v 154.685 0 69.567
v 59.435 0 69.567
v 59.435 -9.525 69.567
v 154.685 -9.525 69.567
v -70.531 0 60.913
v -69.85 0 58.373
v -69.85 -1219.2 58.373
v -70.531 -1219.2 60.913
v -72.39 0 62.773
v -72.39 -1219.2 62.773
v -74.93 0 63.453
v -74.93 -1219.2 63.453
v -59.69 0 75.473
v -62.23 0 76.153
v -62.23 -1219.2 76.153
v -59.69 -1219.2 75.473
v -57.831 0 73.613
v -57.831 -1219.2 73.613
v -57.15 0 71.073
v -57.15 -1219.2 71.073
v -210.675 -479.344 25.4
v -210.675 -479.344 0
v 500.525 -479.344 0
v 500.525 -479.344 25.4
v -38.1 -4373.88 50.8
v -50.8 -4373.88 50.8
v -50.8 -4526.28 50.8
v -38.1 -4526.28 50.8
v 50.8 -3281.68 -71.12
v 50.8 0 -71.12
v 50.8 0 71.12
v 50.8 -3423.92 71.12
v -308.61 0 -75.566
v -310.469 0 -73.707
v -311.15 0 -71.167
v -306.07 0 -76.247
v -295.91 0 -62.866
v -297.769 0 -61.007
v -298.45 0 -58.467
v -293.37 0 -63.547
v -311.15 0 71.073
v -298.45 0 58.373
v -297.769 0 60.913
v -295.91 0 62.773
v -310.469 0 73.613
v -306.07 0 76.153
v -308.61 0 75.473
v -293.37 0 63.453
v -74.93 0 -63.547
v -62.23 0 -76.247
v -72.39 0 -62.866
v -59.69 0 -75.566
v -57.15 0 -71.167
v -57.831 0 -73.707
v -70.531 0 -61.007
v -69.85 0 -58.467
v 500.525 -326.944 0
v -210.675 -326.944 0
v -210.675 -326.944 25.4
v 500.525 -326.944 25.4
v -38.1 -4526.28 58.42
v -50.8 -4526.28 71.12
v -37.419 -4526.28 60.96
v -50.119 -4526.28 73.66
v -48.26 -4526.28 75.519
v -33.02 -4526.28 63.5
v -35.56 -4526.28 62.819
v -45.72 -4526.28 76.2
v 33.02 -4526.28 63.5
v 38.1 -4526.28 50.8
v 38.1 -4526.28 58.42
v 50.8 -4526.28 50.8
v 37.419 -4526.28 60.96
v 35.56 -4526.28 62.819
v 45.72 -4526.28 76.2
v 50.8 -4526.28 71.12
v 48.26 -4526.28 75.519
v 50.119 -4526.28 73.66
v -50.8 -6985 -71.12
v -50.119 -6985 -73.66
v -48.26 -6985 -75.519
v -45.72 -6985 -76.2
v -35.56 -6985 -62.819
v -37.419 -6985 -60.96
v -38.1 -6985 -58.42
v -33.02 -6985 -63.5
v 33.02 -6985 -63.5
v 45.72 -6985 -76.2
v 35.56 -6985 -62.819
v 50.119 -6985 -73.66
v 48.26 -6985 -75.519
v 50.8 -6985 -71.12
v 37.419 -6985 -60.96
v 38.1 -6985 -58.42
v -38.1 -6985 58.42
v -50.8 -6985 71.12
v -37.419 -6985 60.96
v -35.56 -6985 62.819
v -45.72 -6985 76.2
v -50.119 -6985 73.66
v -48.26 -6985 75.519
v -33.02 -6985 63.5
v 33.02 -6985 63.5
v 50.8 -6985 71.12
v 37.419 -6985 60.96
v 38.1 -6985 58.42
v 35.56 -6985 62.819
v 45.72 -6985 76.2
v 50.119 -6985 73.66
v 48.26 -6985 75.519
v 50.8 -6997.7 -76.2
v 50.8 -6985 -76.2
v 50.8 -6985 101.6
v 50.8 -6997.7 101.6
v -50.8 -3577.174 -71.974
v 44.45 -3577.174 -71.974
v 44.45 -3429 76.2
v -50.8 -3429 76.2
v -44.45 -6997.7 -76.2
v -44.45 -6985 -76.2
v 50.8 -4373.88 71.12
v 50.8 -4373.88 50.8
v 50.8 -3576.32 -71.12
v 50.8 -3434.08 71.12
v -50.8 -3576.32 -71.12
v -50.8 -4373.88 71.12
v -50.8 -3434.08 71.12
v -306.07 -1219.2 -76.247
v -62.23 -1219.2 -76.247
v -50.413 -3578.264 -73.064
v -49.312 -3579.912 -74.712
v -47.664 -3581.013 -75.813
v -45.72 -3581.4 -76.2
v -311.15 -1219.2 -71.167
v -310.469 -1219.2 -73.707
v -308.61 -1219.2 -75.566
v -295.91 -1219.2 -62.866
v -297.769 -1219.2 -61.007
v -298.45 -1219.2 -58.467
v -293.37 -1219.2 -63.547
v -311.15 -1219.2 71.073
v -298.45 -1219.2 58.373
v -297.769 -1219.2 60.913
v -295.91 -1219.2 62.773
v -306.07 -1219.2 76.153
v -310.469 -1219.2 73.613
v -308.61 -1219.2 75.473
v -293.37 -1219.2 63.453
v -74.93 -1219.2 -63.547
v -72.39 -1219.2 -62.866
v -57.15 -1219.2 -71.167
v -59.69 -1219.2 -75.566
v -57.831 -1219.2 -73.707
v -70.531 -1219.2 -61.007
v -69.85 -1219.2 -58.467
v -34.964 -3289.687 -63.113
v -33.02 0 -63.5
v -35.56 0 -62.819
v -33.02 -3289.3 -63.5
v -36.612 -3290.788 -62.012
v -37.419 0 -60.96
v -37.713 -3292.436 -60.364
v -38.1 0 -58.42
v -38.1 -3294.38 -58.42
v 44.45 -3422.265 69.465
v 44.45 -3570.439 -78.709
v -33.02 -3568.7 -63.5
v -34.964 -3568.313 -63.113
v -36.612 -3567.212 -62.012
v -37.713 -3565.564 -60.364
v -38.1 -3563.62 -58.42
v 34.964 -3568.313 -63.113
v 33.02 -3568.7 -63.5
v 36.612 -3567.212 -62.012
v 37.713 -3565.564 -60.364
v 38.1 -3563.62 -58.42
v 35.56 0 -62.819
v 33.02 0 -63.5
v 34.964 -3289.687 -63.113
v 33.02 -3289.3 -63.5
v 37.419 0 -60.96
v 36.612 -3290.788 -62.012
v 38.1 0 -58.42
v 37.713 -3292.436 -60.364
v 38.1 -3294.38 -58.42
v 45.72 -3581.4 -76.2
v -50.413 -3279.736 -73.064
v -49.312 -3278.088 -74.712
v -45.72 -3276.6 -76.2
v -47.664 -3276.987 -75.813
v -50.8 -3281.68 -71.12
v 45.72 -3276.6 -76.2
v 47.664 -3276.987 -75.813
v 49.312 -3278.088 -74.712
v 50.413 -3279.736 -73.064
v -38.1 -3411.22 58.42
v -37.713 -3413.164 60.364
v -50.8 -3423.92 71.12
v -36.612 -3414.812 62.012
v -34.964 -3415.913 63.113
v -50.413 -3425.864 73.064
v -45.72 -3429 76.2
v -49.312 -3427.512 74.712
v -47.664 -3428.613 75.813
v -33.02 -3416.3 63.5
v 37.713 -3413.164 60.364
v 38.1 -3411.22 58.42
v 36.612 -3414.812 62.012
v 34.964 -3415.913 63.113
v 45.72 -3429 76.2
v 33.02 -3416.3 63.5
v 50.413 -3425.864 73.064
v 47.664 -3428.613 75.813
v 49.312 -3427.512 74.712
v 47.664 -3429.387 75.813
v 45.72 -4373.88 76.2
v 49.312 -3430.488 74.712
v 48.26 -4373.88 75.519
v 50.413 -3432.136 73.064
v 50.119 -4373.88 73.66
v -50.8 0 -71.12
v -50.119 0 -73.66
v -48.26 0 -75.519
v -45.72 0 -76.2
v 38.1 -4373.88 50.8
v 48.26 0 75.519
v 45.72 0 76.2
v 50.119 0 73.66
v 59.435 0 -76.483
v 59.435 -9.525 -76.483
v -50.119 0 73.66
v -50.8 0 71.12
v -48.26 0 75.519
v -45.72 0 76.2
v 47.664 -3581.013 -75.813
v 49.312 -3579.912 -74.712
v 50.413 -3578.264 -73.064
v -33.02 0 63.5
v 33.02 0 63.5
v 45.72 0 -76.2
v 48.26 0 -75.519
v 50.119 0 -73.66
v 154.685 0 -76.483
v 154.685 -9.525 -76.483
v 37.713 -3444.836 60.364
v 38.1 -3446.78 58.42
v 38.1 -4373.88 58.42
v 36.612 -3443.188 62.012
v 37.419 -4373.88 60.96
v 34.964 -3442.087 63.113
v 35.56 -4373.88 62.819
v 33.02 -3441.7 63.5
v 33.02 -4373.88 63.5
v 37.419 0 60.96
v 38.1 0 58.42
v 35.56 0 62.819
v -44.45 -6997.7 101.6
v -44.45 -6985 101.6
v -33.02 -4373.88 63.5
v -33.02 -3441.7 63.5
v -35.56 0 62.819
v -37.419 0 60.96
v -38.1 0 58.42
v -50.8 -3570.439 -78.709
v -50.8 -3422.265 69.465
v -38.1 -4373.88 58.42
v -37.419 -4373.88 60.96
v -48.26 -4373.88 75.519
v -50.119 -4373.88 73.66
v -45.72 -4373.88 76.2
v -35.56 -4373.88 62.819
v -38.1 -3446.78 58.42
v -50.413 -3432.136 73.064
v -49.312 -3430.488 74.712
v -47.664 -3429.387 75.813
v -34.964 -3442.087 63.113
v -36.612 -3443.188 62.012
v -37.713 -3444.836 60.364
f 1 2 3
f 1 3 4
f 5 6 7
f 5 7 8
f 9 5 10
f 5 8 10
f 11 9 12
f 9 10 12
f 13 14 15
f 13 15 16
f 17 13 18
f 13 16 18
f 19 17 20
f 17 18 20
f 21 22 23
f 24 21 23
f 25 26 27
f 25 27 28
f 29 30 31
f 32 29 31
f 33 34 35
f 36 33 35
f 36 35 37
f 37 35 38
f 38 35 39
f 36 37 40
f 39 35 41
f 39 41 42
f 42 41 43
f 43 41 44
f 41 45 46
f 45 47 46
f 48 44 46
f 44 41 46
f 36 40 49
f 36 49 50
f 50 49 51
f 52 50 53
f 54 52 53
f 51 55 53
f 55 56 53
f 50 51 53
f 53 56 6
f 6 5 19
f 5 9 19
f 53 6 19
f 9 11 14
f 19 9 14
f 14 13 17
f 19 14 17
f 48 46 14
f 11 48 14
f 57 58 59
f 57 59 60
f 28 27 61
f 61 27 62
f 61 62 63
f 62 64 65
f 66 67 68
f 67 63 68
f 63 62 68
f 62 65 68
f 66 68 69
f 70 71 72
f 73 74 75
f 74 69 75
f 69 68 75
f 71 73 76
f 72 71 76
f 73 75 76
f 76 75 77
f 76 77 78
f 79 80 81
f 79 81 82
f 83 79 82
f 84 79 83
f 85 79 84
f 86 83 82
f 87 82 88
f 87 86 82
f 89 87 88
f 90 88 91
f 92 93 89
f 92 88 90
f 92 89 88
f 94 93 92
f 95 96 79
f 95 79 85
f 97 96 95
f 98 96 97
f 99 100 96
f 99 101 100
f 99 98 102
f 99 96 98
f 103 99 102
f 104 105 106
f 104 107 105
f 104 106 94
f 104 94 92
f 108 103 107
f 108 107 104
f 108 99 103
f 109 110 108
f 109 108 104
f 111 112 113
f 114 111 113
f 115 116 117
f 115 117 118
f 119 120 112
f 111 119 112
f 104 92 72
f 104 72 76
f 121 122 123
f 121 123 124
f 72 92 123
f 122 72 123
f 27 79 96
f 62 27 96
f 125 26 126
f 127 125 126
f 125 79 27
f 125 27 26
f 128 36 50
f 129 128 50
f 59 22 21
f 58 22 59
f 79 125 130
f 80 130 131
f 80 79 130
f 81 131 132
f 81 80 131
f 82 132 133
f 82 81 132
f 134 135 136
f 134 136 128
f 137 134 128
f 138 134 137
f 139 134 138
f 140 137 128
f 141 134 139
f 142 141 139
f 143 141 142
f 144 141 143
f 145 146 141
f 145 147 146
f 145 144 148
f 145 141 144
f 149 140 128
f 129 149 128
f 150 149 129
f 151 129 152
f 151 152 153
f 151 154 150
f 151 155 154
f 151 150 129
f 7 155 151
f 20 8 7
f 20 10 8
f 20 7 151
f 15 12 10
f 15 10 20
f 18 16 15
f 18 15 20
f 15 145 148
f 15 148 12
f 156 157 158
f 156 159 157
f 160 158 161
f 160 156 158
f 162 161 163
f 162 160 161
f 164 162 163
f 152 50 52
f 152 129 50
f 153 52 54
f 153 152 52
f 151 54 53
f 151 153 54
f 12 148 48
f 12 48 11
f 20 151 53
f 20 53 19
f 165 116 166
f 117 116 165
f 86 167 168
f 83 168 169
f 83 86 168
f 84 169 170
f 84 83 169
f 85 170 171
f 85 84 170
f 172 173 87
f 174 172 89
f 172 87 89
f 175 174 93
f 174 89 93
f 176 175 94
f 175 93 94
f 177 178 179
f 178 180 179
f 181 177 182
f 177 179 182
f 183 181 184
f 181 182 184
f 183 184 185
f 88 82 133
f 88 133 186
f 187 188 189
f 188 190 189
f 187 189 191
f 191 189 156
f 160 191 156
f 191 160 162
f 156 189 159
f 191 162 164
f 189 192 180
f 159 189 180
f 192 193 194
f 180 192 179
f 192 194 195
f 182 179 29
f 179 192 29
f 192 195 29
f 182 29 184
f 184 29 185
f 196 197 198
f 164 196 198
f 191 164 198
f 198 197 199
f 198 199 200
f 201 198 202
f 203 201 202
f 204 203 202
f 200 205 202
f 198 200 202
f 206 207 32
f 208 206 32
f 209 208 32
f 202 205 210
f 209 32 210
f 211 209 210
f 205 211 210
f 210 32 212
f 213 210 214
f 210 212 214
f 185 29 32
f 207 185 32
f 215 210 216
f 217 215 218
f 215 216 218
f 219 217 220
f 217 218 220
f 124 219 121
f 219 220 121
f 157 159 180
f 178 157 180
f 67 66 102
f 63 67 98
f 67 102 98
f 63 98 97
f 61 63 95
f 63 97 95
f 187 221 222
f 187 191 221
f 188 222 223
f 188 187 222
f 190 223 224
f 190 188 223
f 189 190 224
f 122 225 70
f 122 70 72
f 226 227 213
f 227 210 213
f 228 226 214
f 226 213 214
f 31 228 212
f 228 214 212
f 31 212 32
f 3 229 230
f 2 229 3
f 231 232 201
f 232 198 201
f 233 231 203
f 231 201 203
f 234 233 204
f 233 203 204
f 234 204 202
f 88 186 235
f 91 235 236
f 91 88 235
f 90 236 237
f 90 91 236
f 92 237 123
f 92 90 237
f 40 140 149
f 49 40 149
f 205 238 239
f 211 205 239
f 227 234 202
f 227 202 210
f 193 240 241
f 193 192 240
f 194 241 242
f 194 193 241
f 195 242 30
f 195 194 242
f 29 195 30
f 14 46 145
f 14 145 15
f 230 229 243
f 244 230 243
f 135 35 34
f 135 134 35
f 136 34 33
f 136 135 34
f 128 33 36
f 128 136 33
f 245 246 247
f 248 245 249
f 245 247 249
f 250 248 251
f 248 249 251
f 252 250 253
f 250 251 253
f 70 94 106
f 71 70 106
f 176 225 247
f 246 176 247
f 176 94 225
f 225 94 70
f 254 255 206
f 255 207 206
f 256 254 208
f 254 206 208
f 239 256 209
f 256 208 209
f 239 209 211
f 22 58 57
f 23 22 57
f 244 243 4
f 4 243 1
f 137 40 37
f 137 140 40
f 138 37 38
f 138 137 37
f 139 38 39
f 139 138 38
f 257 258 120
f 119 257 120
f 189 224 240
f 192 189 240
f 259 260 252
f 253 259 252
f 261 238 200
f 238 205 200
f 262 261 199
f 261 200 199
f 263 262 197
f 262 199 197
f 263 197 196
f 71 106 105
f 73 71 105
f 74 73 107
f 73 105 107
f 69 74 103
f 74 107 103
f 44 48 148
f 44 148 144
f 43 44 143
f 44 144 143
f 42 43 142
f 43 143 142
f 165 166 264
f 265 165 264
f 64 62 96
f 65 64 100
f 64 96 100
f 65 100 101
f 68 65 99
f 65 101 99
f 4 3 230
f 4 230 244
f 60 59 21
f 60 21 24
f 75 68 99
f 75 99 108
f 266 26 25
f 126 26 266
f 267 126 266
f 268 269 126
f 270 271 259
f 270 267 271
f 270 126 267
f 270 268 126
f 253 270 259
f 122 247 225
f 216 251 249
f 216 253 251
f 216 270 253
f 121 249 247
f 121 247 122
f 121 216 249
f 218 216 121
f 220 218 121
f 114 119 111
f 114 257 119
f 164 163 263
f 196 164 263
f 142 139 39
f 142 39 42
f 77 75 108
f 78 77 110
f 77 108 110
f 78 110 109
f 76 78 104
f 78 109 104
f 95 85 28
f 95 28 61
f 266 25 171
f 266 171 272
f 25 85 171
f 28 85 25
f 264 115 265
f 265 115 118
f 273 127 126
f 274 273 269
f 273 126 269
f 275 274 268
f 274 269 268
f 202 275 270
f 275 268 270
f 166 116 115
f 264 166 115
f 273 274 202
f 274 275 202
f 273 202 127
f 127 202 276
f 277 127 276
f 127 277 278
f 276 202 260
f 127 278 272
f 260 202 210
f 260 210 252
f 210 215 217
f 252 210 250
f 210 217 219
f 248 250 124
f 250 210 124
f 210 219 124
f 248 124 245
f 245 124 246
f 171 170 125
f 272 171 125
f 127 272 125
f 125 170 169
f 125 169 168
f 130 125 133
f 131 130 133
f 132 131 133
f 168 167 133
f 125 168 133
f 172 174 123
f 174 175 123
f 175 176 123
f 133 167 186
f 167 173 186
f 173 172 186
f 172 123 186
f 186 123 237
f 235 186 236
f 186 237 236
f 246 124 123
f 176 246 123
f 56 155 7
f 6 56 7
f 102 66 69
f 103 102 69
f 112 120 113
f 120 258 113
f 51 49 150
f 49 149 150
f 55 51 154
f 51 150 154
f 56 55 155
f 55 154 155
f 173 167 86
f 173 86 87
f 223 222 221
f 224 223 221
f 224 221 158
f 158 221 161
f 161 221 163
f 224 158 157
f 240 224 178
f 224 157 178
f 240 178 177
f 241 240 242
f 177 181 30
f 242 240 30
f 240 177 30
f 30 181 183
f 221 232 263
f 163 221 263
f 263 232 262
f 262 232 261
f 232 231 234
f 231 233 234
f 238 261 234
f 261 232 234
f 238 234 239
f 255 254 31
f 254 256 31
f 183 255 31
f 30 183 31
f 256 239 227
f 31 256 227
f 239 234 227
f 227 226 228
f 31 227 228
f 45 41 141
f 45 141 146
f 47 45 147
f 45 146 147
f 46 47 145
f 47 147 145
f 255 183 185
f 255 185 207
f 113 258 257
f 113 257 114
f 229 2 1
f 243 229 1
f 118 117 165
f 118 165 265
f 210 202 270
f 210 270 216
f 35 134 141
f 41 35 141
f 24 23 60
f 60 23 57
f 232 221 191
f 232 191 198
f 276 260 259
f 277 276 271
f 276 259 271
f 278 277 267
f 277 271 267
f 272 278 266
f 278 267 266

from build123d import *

# Parameters (mm, degrees)
F1_W      = 254
F1_H      = 152.4
F1_W_2    = 228.6
F1_H_2    = 127
F3_DEPTH  = 1219.2
F0_W      = 101.6
F0_H      = 152.4
F0_W_2    = 76.2
F0_H_2    = 127
F4_DEPTH  = 3429
F2_W      = 95.25
F2_H      = 146.05
F5_DEPTH  = 9.525
F6_DEPTH  = 3556
F9_DEPTH  = 361.951
F10_DEPTH = 361.951
F11_W     = 95.25
F11_H     = 209.55
F11_W_2   = 76.2
F11_H_2   = 179.6051224214
F12_DEPTH = 9.525
F13_W     = 95.25
F13_H     = 152.4
F13_W_2   = 76.2
F13_H_2   = 127
F13_H_3   = 25.4
F14_DEPTH = 12.7
F15_R     = 5.08
F15_2_R   = 5.08
F15_3_R   = 5.08
F16_W     = 711.2
F16_H     = 152.4
F17_DEPTH = 25.4
F18_W     = 246.9795793295
F18_H     = 152.4
F19_DEPTH = 25.4


with BuildPart() as f3:
    # F1 (on Front) → F3 (new body)
    with BuildSketch(Plane.XZ):
        with Locations((-184.15, -0.0468501925)):
            Rectangle(F1_W, F1_H)
        with Locations((-184.15, -0.0468501925)):
            Rectangle(F1_W_2, F1_H_2, mode=Mode.SUBTRACT)
    extrude(amount=F3_DEPTH)

    # F15#3
    f15_3_edges = [f3.edges().sort_by_distance(p)[0] for p in [
        (-69.85, -609.6, 63.45315),
        (-69.85, -609.6, -63.54685),
        (-298.45, -609.6, -63.54685),
        (-298.45, -609.6, 63.45315),
        (-57.15, -609.6, -76.24685),
        (-311.15, -609.6, -76.24685),
        (-311.15, -609.6, 76.15315),
        (-57.15, -609.6, 76.15315),
    ]]
    fillet(f15_3_edges, radius=F15_3_R)


with BuildPart() as f4:
    # F0 (on Front) → F4 (new body)
    with BuildSketch(Plane.XZ):
        Rectangle(F0_W, F0_H)
        Rectangle(F0_W_2, F0_H_2, mode=Mode.SUBTRACT)
    extrude(amount=F4_DEPTH)


with BuildPart() as f5:
    # F2 (on Front) → F5 (new body)
    with BuildSketch(Plane.XZ):
        with Locations((107.0601179898, -3.458078301)):
            Rectangle(F2_W, F2_H)
    extrude(amount=F5_DEPTH)


with BuildPart() as f6:
    # F6 (new): a face of the model
    f6_faces = [f4.part.faces().sort_by_distance(p)[0] for p in [
        (0, -3429, -74.3683799521),
    ]]
    extrude(f6_faces, amount=F6_DEPTH)

    # F7 (on face) → F10 (cut, through all)
    with BuildSketch(Plane.YZ.offset(50.8)):
        Polygon((-3429, -76.2), (-3429, 76.2), (-3581.4, -76.2), align=None)
    extrude(amount=-F10_DEPTH, mode=Mode.SUBTRACT)

    # F15#2
    f15_2_edges = [f6.edges().sort_by_distance(p)[0] for p in [
        (50.8, -5283.2, -76.2),
        (-50.8, -5283.2, -76.2),
        (50.8, -5207, 76.2),
        (-50.8, -5207, 76.2),
        (-38.1, -5213.35, 63.5),
        (38.1, -5213.35, 63.5),
        (38.1, -5276.85, -63.5),
        (-38.1, -5276.85, -63.5),
    ]]
    fillet(f15_2_edges, radius=F15_2_R)

    # F18 (on face) → F19 (cut)
    with BuildSketch(Plane.XY.offset(76.2)):
        with Locations((-5.5087581277, -4450.08)):
            Rectangle(F18_W, F18_H)
    extrude(amount=-F19_DEPTH, mode=Mode.SUBTRACT)


with BuildPart() as f4_1:
    add(f4.part)

    # F8 (on face) → F9 (cut, through all)
    with BuildSketch(Plane.YZ.offset(50.8)):
        Polygon((-3276.6, -76.2), (-3429, 76.2), (-3429, -76.2), align=None)
    extrude(amount=-F9_DEPTH, mode=Mode.SUBTRACT)

    # F15
    f15_edges = [f4_1.edges().sort_by_distance(p)[0] for p in [
        (-50.8, -1714.5, 76.2),
        (-50.8, -1638.3, -76.2),
        (50.8, -1638.3, -76.2),
        (50.8, -1714.5, 76.2),
        (-38.1, -1708.15, 63.5),
        (38.1, -1708.15, 63.5),
        (38.1, -1644.65, -63.5),
        (-38.1, -1644.65, -63.5),
    ]]
    fillet(f15_edges, radius=F15_R)


with BuildPart() as f12:
    # F11 (on face) → F12 (new body)
    with BuildSketch(Plane(origin=(0, -1752.6, 1752.6), x_dir=(-1, 0, 0), z_dir=(0, 0.7071067812, -0.7071067812))):
        with Locations((3.175, -2475.5626159623)):
            Rectangle(F11_W, F11_H)
        with Locations((0, -2478.5506894151)):
            Rectangle(F11_W_2, F11_H_2, mode=Mode.SUBTRACT)
        with Locations((0, -2478.5506894151)):
            Rectangle(F11_W_2, F11_H_2)
    extrude(amount=F12_DEPTH)


with BuildPart() as f14:
    # F13 (on face) → F14 (new body)
    with BuildSketch(Plane.XZ.offset(6985)):
        with Locations((3.175, 0)):
            Rectangle(F13_W, F13_H)
        Rectangle(F13_W_2, F13_H_2, mode=Mode.SUBTRACT)
        Rectangle(F13_W_2, F13_H_2)
        with Locations((3.175, 88.9)):
            Rectangle(F13_W, F13_H_3)
    extrude(amount=F14_DEPTH)


with BuildPart() as f17:
    # F16 (on Top) → F17 (new body)
    with BuildSketch(Plane.XY):
        with Locations((144.9249171257, -403.1442487717)):
            Rectangle(F16_W, F16_H)
    extrude(amount=F17_DEPTH)


solid = Compound([f3.part, f5.part, f6.part, f4_1.part, f12.part, f14.part, f17.part])
